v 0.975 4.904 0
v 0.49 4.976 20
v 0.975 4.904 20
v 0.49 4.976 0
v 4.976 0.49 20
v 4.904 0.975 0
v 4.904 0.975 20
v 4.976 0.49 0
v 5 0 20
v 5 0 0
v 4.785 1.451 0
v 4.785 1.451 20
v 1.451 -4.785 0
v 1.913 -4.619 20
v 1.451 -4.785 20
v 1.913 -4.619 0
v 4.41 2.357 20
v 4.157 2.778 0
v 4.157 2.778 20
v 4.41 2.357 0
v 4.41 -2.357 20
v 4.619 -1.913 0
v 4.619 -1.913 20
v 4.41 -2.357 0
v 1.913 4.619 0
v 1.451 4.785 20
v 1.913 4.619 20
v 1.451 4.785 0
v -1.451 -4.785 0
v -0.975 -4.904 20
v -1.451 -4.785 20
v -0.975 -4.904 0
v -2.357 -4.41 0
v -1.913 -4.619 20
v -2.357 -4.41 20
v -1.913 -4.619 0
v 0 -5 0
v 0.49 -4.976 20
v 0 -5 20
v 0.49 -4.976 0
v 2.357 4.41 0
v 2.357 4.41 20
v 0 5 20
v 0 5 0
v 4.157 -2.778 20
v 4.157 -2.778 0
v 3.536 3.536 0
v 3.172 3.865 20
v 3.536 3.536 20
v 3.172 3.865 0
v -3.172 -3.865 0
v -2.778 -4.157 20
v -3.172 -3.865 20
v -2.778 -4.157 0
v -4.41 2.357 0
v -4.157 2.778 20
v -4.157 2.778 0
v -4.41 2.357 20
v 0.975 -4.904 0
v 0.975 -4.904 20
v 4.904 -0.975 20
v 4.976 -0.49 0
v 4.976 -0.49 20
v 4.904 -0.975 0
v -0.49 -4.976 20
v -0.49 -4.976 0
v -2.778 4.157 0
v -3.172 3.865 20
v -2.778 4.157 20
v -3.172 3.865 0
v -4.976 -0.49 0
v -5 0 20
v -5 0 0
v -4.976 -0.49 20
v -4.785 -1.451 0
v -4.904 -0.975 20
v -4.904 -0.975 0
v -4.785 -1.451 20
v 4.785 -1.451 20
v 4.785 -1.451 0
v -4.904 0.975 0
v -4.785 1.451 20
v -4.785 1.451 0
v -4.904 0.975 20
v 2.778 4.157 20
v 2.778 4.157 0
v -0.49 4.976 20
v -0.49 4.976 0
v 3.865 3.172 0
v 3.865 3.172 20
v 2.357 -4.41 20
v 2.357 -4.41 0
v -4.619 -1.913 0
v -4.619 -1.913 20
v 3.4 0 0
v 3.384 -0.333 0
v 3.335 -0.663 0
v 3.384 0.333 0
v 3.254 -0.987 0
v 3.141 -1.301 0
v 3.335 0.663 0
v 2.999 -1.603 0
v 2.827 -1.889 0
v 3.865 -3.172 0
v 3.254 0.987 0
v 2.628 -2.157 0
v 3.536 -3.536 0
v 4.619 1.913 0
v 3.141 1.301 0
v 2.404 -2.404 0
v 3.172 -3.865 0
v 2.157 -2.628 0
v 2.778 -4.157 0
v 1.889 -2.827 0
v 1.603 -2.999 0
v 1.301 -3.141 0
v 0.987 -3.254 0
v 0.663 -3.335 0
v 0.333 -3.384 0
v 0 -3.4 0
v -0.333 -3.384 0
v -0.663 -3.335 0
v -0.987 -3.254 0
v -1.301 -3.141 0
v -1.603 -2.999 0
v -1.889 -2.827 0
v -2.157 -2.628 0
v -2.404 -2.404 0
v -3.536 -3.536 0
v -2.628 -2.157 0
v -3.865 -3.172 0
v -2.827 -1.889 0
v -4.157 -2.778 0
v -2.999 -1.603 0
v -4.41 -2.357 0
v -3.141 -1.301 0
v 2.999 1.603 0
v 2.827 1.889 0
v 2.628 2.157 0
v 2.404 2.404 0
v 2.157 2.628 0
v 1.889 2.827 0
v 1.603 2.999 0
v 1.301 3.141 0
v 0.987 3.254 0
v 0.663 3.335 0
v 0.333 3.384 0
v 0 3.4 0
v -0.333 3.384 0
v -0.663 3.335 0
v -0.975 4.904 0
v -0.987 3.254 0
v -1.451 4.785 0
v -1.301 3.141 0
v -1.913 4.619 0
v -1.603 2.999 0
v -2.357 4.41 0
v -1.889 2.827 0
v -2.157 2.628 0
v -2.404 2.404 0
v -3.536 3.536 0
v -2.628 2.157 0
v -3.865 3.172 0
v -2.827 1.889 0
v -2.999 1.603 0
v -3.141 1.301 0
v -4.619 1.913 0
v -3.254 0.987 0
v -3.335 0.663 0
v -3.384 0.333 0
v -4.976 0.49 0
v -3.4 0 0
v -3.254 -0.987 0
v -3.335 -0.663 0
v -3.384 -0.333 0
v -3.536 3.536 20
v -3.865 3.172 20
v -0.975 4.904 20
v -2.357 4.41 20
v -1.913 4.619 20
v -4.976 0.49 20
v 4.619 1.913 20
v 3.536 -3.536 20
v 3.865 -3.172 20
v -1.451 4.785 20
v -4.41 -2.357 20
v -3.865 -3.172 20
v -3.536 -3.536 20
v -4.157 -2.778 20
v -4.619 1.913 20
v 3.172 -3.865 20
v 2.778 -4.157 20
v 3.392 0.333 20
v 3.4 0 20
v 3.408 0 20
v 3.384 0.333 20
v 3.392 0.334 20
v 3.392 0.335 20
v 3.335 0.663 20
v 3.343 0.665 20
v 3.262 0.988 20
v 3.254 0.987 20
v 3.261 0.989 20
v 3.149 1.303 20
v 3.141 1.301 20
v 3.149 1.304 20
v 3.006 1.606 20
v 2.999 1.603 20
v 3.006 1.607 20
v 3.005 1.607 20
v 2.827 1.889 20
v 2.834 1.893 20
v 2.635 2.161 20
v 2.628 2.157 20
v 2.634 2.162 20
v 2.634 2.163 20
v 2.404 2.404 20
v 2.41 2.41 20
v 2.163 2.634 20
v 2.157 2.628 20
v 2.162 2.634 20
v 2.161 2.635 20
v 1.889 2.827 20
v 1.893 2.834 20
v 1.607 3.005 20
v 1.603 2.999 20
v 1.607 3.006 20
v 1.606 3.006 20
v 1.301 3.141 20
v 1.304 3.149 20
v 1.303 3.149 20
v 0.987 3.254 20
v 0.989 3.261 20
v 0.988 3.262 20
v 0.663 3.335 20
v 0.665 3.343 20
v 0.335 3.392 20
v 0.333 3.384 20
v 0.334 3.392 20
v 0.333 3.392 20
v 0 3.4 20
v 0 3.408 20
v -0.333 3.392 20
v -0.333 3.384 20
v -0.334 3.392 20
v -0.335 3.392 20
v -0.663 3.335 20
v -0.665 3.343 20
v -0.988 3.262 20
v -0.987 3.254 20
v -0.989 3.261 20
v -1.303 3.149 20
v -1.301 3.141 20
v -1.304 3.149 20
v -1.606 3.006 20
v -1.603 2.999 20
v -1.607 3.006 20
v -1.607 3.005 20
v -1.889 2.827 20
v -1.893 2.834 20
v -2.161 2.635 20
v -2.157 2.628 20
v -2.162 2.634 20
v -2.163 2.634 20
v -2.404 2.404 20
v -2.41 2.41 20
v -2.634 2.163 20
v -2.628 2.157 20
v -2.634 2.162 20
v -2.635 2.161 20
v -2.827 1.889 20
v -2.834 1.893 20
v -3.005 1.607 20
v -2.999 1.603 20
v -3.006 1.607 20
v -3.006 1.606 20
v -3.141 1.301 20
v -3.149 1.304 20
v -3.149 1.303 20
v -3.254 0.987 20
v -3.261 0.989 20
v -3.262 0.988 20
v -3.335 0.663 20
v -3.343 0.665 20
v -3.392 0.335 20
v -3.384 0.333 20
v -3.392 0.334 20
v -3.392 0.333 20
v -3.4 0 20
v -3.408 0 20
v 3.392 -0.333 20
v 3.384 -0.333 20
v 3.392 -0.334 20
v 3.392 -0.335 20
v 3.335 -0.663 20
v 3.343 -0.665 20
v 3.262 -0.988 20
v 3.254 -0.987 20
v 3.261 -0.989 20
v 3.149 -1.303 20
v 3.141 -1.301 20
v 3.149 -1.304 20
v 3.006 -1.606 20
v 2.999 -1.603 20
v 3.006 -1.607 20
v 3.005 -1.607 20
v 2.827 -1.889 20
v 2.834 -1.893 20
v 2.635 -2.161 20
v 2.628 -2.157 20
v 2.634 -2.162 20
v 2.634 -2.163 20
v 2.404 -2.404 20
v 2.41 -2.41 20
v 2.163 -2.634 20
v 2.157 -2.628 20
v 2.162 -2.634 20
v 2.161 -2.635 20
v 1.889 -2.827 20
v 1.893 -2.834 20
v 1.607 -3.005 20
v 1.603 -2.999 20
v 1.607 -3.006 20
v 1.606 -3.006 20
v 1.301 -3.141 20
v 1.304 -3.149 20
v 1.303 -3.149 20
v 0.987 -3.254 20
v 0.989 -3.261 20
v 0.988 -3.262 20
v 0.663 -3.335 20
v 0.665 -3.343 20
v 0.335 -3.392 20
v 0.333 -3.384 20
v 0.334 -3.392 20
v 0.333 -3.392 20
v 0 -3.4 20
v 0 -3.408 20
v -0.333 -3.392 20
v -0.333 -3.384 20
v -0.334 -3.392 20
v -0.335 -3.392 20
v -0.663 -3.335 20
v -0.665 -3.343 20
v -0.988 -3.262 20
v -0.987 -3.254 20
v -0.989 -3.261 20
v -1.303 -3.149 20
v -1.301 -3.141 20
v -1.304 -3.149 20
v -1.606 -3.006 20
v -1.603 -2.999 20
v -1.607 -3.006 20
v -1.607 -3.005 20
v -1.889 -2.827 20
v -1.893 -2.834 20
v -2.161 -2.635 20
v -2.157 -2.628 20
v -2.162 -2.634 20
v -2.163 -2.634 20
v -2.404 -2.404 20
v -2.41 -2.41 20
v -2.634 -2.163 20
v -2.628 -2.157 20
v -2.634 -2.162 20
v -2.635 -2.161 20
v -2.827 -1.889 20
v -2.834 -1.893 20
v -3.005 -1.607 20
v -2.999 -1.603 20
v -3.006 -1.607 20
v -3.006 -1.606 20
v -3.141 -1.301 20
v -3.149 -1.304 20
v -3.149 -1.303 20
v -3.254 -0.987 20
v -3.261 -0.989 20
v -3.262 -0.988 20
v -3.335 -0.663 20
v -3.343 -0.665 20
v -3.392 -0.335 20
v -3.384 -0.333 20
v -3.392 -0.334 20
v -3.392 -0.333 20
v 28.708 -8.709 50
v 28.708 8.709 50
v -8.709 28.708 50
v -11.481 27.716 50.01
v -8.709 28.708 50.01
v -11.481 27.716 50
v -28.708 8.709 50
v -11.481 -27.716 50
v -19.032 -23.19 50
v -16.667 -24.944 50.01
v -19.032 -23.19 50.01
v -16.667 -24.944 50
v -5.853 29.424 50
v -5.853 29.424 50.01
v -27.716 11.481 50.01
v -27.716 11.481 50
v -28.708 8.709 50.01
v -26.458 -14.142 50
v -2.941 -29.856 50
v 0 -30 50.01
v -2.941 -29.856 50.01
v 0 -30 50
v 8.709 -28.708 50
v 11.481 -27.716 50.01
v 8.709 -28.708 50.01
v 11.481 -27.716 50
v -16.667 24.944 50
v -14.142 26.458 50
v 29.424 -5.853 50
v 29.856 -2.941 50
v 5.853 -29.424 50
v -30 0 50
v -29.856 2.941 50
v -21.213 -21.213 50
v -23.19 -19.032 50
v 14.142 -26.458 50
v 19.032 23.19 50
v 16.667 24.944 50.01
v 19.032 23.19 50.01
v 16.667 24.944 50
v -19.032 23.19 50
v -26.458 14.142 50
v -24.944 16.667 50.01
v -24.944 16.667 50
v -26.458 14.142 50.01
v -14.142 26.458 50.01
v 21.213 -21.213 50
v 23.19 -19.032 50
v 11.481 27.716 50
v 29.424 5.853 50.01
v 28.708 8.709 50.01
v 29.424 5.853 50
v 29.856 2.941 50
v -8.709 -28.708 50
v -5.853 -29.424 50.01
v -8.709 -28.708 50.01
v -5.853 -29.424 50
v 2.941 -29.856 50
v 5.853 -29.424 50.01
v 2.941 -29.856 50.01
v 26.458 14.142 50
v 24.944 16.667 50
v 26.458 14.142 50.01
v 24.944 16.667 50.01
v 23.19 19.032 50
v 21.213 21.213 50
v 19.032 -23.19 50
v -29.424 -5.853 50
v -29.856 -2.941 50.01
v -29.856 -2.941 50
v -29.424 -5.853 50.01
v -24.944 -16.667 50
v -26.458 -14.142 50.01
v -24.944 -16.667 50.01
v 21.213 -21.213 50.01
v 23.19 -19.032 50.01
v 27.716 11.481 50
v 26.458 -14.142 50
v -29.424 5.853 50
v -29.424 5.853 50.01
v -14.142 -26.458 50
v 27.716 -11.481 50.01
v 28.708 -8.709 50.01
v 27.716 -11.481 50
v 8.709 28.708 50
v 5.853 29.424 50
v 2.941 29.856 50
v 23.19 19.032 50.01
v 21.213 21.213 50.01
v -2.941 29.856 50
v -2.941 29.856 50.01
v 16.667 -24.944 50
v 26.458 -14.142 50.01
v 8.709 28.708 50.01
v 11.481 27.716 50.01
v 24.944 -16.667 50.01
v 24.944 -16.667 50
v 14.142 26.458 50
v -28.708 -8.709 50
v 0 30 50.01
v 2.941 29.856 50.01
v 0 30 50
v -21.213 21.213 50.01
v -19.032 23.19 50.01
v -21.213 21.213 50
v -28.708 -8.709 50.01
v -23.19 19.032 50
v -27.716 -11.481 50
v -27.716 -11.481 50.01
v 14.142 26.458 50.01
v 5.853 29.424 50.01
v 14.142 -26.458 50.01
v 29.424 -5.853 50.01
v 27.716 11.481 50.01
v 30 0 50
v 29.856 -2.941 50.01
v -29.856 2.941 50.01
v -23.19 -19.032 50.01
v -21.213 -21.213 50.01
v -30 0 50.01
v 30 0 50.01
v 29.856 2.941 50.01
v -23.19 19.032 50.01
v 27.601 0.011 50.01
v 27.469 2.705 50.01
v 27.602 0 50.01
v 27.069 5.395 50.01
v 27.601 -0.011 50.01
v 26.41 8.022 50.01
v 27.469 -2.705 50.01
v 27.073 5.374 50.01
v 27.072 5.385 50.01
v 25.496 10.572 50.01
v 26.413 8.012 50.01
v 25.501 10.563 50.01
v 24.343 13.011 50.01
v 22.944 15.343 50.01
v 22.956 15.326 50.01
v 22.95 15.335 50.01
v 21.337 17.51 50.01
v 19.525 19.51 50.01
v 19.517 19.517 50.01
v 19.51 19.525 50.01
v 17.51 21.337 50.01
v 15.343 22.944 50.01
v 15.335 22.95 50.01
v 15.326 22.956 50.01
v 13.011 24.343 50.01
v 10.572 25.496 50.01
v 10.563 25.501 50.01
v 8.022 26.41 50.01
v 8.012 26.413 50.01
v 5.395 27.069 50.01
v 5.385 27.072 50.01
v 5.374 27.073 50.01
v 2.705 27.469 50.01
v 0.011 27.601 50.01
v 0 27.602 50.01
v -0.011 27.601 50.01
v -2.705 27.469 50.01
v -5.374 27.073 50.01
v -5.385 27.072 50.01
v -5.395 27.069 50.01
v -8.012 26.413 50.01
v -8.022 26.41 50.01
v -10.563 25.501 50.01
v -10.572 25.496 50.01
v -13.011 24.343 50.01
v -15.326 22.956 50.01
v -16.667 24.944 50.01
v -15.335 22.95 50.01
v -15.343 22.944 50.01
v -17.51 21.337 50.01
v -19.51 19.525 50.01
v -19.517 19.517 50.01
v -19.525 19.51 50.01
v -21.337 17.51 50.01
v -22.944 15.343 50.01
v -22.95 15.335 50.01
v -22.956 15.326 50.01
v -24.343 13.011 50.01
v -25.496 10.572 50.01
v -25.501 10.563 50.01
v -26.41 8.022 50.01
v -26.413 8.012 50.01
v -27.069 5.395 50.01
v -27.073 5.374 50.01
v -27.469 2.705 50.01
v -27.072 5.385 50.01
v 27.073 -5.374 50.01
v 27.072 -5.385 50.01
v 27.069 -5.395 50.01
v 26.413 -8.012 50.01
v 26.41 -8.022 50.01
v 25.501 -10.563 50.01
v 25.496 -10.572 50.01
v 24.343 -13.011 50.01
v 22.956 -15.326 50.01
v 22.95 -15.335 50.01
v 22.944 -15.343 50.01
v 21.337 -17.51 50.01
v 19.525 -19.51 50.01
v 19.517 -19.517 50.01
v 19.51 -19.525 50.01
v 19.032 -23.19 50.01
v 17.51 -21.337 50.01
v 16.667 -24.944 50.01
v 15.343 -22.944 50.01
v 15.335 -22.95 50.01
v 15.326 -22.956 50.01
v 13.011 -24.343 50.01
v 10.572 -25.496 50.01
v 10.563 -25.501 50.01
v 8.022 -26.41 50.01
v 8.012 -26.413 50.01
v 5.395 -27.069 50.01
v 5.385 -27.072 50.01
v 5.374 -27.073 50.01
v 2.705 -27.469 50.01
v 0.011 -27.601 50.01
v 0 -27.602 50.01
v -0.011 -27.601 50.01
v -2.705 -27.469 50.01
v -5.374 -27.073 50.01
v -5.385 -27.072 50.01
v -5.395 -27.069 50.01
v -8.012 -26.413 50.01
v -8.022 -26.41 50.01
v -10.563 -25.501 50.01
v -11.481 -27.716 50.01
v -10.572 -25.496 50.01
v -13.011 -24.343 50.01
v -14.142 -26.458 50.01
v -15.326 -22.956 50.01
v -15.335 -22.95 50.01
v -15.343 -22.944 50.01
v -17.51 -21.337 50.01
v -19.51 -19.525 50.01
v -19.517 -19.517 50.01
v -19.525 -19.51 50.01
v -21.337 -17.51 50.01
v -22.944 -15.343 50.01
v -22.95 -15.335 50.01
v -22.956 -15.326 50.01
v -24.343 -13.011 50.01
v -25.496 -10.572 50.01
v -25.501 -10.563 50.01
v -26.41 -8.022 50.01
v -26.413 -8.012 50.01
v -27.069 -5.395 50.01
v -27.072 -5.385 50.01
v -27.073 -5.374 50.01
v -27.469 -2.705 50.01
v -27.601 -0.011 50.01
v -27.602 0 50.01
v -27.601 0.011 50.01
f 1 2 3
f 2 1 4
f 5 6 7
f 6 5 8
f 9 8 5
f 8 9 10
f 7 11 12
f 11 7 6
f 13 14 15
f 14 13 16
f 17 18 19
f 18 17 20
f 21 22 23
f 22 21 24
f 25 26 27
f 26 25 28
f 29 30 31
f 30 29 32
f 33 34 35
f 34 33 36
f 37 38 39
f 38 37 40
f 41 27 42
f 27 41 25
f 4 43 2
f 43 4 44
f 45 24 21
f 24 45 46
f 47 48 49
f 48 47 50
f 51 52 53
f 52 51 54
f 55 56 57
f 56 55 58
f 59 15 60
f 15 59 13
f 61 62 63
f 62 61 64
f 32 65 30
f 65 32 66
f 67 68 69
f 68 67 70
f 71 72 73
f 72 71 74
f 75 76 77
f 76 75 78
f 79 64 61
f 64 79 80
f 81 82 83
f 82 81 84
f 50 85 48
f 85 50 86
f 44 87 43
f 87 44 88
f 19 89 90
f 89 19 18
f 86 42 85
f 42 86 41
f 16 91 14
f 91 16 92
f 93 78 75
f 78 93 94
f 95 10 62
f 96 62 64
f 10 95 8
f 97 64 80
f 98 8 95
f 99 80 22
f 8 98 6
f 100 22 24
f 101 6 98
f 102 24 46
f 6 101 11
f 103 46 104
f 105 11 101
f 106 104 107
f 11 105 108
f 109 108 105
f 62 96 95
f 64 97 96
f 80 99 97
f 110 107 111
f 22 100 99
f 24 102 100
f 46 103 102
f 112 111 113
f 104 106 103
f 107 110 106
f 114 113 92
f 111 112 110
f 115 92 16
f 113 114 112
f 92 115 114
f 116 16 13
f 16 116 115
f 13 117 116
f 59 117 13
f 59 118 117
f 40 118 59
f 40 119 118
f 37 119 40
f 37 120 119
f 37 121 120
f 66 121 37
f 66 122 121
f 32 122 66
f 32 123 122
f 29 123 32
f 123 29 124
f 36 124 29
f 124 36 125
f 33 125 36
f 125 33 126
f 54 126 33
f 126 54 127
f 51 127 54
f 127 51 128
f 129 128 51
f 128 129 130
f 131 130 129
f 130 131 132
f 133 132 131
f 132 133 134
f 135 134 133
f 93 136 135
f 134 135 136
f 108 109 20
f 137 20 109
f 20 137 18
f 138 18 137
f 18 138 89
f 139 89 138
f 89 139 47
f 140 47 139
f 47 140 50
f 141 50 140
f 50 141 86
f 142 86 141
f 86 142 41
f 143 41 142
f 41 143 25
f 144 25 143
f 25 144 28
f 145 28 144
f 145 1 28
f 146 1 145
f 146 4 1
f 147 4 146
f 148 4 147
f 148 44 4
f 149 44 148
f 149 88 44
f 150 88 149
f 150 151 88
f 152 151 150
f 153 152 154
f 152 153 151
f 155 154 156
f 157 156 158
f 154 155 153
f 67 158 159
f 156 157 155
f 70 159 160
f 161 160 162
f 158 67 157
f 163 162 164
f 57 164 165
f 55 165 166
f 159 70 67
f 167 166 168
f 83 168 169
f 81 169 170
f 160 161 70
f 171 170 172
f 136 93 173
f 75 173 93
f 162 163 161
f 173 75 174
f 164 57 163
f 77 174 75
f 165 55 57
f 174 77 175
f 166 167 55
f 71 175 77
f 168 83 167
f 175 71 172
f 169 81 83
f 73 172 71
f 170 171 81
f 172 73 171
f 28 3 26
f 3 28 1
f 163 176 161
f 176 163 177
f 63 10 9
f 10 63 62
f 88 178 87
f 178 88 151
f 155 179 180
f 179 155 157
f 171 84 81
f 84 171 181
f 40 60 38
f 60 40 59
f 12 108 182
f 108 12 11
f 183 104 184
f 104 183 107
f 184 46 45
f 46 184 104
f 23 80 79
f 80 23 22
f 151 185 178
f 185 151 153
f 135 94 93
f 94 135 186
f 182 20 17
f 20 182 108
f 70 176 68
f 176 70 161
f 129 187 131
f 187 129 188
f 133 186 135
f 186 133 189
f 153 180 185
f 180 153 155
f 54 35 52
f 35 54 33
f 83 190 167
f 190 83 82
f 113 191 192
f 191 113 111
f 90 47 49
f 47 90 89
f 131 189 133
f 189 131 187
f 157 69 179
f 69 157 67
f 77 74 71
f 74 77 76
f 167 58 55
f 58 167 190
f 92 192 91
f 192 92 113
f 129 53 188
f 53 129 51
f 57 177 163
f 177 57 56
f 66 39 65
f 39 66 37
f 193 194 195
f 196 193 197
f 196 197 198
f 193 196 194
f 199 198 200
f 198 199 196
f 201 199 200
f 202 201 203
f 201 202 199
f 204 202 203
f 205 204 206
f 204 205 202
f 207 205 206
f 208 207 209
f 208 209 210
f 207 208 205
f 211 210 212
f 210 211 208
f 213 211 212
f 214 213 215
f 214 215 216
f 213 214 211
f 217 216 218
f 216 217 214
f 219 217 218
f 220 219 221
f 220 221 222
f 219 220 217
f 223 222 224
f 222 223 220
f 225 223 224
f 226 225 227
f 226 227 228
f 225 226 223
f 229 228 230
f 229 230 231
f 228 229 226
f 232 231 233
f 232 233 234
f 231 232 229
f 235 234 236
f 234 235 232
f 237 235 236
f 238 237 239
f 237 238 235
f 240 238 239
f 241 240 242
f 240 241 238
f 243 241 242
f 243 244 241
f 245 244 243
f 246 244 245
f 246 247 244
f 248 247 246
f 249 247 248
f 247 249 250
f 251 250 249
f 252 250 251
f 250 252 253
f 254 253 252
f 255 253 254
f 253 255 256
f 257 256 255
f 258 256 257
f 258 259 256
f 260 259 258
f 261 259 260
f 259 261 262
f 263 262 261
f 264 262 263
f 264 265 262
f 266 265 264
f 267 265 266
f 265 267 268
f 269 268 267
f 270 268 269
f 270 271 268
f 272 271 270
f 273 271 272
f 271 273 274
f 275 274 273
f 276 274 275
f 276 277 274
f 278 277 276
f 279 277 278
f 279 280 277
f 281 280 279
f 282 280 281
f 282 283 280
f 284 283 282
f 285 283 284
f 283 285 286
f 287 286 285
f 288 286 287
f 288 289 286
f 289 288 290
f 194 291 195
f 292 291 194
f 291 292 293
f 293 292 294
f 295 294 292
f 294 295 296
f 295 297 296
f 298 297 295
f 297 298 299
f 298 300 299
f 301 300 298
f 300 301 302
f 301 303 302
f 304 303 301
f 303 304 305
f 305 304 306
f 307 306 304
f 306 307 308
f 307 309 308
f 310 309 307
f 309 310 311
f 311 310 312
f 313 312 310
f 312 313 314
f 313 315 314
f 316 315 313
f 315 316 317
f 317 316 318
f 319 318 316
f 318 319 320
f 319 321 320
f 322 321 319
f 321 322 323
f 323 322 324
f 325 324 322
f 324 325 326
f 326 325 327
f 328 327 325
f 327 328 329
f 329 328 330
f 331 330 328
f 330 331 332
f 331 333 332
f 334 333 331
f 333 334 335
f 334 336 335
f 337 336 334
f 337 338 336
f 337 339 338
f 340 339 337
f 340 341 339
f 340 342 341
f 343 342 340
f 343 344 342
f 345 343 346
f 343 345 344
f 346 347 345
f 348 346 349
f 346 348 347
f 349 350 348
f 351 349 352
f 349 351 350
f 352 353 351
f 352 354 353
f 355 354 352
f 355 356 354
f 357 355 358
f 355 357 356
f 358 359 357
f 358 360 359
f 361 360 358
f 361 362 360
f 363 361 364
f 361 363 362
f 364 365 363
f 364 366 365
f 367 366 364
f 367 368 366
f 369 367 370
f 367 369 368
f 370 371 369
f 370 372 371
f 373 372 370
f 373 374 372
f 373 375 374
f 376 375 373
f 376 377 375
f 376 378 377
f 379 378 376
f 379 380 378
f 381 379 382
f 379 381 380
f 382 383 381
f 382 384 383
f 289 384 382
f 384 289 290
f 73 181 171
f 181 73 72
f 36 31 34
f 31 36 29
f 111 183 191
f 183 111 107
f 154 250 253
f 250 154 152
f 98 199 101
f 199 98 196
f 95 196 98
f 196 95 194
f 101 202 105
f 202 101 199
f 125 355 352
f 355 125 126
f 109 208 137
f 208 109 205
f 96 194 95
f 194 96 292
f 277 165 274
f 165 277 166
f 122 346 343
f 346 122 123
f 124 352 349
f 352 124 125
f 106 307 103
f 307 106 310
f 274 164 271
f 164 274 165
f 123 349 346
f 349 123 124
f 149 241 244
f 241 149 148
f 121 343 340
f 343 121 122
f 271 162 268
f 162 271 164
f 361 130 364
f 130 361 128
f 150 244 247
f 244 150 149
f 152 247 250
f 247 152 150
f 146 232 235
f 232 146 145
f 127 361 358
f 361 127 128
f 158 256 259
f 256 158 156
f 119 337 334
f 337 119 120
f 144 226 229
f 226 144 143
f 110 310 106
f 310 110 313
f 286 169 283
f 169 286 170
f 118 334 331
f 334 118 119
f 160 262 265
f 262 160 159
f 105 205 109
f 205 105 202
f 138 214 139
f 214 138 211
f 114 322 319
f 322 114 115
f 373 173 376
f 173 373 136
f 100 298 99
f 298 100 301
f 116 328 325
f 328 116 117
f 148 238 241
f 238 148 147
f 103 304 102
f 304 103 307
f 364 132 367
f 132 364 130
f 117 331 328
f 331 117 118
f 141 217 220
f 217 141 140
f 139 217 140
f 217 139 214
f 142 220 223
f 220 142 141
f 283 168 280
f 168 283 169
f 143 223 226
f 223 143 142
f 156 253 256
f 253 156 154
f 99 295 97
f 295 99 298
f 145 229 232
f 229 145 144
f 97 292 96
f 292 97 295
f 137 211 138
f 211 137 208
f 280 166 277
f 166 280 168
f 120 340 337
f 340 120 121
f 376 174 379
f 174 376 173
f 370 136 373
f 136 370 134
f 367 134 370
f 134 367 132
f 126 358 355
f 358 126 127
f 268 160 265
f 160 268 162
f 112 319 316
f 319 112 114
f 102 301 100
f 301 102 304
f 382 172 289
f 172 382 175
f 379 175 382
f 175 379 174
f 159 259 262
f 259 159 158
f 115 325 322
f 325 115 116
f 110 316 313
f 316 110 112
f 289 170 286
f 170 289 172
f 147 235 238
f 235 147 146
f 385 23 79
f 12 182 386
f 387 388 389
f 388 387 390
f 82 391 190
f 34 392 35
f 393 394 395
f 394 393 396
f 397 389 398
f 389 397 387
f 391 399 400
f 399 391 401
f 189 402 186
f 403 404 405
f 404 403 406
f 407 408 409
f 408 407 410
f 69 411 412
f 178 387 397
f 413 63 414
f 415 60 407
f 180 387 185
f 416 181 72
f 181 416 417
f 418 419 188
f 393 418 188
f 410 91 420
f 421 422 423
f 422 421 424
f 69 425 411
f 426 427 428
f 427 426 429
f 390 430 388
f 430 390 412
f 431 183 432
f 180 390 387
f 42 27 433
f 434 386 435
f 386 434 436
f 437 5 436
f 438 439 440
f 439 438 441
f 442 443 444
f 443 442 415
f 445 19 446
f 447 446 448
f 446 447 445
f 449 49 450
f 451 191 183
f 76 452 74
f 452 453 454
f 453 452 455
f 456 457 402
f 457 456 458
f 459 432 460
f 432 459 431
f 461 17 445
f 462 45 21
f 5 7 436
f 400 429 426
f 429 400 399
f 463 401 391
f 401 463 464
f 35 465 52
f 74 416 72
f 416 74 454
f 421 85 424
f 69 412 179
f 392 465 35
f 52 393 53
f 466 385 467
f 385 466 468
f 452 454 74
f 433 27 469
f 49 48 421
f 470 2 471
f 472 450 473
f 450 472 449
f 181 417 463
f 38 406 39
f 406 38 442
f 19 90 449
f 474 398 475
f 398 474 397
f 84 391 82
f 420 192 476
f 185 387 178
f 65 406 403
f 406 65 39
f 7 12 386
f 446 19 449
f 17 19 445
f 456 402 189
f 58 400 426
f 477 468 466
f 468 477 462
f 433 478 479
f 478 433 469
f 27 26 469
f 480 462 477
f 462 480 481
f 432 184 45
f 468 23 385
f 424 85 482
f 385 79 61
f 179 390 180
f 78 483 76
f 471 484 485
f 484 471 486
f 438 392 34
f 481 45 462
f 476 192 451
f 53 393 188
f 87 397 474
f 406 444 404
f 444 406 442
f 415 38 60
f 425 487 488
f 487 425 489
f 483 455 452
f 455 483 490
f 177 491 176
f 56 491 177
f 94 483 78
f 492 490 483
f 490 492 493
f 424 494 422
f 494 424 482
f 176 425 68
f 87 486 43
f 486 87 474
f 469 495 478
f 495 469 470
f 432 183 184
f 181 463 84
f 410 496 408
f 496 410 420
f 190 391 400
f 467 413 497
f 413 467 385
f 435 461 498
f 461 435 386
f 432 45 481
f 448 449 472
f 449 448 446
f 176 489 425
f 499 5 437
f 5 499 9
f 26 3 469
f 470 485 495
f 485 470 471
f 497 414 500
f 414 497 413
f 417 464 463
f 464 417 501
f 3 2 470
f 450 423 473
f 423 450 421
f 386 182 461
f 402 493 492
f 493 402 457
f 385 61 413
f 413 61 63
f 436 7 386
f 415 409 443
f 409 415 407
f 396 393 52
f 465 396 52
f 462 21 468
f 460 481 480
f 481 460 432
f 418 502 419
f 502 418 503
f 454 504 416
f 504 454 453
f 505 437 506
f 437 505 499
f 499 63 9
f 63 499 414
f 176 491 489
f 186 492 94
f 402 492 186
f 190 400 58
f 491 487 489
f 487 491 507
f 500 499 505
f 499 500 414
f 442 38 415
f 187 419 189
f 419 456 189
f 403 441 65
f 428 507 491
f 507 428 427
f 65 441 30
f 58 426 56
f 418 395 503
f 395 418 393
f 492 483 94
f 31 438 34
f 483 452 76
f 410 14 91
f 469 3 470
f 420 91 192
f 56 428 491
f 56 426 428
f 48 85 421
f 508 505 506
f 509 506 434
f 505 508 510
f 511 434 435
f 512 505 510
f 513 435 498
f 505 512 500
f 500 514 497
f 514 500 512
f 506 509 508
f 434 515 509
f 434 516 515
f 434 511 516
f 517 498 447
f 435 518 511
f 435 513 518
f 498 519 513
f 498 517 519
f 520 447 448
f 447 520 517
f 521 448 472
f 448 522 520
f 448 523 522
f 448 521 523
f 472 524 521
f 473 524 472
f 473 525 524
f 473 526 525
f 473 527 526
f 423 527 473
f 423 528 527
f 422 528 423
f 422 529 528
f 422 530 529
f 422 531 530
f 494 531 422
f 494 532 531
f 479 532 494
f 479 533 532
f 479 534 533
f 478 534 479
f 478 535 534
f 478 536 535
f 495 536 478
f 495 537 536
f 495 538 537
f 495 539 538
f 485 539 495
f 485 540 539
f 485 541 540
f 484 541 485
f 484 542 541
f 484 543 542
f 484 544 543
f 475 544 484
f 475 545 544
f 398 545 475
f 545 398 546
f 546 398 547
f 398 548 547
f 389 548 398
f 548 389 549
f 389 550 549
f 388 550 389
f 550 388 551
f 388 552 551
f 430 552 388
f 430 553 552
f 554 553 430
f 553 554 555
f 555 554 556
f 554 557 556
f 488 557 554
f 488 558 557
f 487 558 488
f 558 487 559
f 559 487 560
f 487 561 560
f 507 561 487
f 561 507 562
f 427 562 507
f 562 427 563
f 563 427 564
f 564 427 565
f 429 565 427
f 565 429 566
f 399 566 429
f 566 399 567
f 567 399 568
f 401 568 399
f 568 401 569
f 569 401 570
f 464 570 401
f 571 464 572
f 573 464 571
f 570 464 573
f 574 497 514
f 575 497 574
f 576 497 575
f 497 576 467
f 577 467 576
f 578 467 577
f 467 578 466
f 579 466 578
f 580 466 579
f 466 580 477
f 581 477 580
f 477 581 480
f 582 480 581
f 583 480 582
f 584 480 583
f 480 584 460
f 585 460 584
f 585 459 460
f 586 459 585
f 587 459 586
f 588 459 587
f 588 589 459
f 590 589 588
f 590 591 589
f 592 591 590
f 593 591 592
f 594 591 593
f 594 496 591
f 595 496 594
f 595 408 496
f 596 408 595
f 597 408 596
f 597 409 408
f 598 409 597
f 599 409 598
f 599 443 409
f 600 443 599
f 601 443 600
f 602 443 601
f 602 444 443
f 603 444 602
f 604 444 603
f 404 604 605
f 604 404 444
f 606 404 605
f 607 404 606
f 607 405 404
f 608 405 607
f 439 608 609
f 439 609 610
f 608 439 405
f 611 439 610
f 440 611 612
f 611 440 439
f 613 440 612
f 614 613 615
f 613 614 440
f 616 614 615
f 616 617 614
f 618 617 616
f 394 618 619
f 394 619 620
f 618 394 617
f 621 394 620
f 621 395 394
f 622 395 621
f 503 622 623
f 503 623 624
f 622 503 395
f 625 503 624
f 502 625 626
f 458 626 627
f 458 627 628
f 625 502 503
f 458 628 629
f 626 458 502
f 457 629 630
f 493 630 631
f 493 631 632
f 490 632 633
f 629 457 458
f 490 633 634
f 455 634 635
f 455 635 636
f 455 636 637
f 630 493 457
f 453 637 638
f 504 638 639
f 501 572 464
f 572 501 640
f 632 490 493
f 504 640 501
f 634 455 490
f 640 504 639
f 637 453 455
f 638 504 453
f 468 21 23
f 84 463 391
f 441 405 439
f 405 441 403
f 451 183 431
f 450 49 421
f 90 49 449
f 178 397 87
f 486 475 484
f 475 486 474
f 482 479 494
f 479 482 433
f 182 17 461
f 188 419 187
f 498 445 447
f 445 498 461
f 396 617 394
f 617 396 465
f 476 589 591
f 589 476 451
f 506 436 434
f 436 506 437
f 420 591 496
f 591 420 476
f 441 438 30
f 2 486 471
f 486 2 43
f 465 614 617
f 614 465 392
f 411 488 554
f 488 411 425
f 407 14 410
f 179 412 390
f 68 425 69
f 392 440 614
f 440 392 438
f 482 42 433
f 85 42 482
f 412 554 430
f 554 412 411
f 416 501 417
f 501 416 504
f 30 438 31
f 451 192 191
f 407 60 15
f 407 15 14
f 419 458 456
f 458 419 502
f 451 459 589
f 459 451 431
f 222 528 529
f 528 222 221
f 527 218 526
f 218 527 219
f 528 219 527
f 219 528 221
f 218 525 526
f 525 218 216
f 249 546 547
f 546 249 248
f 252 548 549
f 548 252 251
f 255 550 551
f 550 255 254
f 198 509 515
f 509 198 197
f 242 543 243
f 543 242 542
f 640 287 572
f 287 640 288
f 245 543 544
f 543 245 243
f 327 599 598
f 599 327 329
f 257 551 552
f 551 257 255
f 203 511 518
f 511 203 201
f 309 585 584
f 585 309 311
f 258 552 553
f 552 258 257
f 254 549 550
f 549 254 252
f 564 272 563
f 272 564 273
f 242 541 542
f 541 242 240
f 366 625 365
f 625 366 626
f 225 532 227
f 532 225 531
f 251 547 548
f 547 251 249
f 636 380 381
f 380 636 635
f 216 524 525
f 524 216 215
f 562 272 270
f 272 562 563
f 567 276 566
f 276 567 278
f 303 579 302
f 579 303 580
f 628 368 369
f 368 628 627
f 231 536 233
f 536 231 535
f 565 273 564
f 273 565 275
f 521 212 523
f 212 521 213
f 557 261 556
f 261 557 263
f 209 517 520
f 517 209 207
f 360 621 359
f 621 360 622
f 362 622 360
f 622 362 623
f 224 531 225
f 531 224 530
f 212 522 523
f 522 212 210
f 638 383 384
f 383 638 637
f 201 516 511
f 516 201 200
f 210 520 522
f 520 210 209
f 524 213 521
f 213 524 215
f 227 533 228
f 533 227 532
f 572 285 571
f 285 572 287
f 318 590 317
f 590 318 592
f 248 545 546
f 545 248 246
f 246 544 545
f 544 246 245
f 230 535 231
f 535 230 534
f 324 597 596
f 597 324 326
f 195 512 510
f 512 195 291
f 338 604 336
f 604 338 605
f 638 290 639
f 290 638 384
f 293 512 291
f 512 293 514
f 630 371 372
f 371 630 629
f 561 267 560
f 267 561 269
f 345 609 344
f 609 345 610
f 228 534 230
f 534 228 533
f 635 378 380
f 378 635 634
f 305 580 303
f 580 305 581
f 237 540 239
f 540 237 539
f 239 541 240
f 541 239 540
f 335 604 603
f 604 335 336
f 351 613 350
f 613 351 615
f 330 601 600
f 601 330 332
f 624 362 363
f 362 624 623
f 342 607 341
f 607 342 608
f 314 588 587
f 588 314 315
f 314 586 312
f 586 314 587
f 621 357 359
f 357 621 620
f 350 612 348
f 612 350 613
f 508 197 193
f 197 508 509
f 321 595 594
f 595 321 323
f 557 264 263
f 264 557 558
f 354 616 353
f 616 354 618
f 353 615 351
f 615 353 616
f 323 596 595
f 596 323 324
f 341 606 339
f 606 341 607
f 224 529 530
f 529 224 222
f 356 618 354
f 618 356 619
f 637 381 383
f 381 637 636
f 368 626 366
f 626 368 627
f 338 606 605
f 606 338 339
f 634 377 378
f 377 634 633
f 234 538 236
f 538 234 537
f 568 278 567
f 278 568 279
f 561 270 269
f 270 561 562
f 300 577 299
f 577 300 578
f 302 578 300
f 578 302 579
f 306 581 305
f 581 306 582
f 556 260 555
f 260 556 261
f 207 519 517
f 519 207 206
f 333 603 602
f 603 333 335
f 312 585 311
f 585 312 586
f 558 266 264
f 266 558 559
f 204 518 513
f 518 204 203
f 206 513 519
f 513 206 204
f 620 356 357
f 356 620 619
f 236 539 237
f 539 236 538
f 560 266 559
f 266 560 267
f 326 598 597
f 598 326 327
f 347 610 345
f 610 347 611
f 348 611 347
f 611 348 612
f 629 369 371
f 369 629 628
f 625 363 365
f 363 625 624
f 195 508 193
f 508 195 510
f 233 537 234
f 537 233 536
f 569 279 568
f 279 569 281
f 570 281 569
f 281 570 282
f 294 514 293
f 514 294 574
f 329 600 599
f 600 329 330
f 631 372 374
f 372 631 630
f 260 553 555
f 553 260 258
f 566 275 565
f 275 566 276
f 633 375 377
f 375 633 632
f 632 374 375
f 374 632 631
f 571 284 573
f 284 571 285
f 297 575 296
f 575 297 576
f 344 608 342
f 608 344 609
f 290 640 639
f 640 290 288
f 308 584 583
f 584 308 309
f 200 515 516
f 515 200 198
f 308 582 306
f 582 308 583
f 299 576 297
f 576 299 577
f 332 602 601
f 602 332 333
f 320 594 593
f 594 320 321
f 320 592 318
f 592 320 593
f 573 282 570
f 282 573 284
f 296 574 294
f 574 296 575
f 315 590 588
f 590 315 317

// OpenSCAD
// Lab Funnel Design
// Units: mm
// Print Orientation: Upright (Base at Z=0)

// --- Dimensions ---
spout_outer_diameter = 10.0;      // Outer diameter of the spout
spout_height = 20.0;             // Height of the spout (from Z=0 to Z=20)
funnel_rim_diameter = 60.0;      // Outer diameter at the top rim
funnel_height = 50.0;            // Total height from base to rim
wall_thickness = 1.6;            // Constant wall thickness
$fn = 64;                        // Smoothness for curves

// --- Calculated Dimensions ---
spout_inner_diameter = spout_outer_diameter - (2 * wall_thickness);
funnel_inner_rim_diameter = funnel_rim_diameter - (2 * wall_thickness);

// --- Main Construction ---

union() {
    // 1. The Spout (Cylinder)
    difference() {
        // Outer shape
        cylinder(h = spout_height, d = spout_outer_diameter);
        
        // Inner bore (extended slightly to ensure clean cut)
        translate([0, 0, -1])
            cylinder(h = spout_height + 2, d = spout_inner_diameter);
    }

    // 2. The Funnel Cone
    difference() {
        // Outer Cone
        hull() {
            // Bottom of cone (at Z=20)
            translate([0, 0, spout_height])
                cylinder(h = 0.01, d = spout_outer_diameter);
            
            // Top of cone (at Z=50)
            translate([0, 0, funnel_height])
                cylinder(h = 0.01, d = funnel_rim_diameter);
        }

        // Inner Cone (to create the hollow part)
        hull() {
            // Bottom of inner cone (at Z=20)
            translate([0, 0, spout_height - 0.01])
                cylinder(h = 0.01, d = spout_inner_diameter);
            
            // Top of inner cone (at Z=50)
            translate([0, 0, funnel_height + 1])
                cylinder(h = 1, d = funnel_inner_rim_diameter);
        }
    }
}

// Note: The model is centered on X and Y. 
// The base of the spout sits at Z=0.
